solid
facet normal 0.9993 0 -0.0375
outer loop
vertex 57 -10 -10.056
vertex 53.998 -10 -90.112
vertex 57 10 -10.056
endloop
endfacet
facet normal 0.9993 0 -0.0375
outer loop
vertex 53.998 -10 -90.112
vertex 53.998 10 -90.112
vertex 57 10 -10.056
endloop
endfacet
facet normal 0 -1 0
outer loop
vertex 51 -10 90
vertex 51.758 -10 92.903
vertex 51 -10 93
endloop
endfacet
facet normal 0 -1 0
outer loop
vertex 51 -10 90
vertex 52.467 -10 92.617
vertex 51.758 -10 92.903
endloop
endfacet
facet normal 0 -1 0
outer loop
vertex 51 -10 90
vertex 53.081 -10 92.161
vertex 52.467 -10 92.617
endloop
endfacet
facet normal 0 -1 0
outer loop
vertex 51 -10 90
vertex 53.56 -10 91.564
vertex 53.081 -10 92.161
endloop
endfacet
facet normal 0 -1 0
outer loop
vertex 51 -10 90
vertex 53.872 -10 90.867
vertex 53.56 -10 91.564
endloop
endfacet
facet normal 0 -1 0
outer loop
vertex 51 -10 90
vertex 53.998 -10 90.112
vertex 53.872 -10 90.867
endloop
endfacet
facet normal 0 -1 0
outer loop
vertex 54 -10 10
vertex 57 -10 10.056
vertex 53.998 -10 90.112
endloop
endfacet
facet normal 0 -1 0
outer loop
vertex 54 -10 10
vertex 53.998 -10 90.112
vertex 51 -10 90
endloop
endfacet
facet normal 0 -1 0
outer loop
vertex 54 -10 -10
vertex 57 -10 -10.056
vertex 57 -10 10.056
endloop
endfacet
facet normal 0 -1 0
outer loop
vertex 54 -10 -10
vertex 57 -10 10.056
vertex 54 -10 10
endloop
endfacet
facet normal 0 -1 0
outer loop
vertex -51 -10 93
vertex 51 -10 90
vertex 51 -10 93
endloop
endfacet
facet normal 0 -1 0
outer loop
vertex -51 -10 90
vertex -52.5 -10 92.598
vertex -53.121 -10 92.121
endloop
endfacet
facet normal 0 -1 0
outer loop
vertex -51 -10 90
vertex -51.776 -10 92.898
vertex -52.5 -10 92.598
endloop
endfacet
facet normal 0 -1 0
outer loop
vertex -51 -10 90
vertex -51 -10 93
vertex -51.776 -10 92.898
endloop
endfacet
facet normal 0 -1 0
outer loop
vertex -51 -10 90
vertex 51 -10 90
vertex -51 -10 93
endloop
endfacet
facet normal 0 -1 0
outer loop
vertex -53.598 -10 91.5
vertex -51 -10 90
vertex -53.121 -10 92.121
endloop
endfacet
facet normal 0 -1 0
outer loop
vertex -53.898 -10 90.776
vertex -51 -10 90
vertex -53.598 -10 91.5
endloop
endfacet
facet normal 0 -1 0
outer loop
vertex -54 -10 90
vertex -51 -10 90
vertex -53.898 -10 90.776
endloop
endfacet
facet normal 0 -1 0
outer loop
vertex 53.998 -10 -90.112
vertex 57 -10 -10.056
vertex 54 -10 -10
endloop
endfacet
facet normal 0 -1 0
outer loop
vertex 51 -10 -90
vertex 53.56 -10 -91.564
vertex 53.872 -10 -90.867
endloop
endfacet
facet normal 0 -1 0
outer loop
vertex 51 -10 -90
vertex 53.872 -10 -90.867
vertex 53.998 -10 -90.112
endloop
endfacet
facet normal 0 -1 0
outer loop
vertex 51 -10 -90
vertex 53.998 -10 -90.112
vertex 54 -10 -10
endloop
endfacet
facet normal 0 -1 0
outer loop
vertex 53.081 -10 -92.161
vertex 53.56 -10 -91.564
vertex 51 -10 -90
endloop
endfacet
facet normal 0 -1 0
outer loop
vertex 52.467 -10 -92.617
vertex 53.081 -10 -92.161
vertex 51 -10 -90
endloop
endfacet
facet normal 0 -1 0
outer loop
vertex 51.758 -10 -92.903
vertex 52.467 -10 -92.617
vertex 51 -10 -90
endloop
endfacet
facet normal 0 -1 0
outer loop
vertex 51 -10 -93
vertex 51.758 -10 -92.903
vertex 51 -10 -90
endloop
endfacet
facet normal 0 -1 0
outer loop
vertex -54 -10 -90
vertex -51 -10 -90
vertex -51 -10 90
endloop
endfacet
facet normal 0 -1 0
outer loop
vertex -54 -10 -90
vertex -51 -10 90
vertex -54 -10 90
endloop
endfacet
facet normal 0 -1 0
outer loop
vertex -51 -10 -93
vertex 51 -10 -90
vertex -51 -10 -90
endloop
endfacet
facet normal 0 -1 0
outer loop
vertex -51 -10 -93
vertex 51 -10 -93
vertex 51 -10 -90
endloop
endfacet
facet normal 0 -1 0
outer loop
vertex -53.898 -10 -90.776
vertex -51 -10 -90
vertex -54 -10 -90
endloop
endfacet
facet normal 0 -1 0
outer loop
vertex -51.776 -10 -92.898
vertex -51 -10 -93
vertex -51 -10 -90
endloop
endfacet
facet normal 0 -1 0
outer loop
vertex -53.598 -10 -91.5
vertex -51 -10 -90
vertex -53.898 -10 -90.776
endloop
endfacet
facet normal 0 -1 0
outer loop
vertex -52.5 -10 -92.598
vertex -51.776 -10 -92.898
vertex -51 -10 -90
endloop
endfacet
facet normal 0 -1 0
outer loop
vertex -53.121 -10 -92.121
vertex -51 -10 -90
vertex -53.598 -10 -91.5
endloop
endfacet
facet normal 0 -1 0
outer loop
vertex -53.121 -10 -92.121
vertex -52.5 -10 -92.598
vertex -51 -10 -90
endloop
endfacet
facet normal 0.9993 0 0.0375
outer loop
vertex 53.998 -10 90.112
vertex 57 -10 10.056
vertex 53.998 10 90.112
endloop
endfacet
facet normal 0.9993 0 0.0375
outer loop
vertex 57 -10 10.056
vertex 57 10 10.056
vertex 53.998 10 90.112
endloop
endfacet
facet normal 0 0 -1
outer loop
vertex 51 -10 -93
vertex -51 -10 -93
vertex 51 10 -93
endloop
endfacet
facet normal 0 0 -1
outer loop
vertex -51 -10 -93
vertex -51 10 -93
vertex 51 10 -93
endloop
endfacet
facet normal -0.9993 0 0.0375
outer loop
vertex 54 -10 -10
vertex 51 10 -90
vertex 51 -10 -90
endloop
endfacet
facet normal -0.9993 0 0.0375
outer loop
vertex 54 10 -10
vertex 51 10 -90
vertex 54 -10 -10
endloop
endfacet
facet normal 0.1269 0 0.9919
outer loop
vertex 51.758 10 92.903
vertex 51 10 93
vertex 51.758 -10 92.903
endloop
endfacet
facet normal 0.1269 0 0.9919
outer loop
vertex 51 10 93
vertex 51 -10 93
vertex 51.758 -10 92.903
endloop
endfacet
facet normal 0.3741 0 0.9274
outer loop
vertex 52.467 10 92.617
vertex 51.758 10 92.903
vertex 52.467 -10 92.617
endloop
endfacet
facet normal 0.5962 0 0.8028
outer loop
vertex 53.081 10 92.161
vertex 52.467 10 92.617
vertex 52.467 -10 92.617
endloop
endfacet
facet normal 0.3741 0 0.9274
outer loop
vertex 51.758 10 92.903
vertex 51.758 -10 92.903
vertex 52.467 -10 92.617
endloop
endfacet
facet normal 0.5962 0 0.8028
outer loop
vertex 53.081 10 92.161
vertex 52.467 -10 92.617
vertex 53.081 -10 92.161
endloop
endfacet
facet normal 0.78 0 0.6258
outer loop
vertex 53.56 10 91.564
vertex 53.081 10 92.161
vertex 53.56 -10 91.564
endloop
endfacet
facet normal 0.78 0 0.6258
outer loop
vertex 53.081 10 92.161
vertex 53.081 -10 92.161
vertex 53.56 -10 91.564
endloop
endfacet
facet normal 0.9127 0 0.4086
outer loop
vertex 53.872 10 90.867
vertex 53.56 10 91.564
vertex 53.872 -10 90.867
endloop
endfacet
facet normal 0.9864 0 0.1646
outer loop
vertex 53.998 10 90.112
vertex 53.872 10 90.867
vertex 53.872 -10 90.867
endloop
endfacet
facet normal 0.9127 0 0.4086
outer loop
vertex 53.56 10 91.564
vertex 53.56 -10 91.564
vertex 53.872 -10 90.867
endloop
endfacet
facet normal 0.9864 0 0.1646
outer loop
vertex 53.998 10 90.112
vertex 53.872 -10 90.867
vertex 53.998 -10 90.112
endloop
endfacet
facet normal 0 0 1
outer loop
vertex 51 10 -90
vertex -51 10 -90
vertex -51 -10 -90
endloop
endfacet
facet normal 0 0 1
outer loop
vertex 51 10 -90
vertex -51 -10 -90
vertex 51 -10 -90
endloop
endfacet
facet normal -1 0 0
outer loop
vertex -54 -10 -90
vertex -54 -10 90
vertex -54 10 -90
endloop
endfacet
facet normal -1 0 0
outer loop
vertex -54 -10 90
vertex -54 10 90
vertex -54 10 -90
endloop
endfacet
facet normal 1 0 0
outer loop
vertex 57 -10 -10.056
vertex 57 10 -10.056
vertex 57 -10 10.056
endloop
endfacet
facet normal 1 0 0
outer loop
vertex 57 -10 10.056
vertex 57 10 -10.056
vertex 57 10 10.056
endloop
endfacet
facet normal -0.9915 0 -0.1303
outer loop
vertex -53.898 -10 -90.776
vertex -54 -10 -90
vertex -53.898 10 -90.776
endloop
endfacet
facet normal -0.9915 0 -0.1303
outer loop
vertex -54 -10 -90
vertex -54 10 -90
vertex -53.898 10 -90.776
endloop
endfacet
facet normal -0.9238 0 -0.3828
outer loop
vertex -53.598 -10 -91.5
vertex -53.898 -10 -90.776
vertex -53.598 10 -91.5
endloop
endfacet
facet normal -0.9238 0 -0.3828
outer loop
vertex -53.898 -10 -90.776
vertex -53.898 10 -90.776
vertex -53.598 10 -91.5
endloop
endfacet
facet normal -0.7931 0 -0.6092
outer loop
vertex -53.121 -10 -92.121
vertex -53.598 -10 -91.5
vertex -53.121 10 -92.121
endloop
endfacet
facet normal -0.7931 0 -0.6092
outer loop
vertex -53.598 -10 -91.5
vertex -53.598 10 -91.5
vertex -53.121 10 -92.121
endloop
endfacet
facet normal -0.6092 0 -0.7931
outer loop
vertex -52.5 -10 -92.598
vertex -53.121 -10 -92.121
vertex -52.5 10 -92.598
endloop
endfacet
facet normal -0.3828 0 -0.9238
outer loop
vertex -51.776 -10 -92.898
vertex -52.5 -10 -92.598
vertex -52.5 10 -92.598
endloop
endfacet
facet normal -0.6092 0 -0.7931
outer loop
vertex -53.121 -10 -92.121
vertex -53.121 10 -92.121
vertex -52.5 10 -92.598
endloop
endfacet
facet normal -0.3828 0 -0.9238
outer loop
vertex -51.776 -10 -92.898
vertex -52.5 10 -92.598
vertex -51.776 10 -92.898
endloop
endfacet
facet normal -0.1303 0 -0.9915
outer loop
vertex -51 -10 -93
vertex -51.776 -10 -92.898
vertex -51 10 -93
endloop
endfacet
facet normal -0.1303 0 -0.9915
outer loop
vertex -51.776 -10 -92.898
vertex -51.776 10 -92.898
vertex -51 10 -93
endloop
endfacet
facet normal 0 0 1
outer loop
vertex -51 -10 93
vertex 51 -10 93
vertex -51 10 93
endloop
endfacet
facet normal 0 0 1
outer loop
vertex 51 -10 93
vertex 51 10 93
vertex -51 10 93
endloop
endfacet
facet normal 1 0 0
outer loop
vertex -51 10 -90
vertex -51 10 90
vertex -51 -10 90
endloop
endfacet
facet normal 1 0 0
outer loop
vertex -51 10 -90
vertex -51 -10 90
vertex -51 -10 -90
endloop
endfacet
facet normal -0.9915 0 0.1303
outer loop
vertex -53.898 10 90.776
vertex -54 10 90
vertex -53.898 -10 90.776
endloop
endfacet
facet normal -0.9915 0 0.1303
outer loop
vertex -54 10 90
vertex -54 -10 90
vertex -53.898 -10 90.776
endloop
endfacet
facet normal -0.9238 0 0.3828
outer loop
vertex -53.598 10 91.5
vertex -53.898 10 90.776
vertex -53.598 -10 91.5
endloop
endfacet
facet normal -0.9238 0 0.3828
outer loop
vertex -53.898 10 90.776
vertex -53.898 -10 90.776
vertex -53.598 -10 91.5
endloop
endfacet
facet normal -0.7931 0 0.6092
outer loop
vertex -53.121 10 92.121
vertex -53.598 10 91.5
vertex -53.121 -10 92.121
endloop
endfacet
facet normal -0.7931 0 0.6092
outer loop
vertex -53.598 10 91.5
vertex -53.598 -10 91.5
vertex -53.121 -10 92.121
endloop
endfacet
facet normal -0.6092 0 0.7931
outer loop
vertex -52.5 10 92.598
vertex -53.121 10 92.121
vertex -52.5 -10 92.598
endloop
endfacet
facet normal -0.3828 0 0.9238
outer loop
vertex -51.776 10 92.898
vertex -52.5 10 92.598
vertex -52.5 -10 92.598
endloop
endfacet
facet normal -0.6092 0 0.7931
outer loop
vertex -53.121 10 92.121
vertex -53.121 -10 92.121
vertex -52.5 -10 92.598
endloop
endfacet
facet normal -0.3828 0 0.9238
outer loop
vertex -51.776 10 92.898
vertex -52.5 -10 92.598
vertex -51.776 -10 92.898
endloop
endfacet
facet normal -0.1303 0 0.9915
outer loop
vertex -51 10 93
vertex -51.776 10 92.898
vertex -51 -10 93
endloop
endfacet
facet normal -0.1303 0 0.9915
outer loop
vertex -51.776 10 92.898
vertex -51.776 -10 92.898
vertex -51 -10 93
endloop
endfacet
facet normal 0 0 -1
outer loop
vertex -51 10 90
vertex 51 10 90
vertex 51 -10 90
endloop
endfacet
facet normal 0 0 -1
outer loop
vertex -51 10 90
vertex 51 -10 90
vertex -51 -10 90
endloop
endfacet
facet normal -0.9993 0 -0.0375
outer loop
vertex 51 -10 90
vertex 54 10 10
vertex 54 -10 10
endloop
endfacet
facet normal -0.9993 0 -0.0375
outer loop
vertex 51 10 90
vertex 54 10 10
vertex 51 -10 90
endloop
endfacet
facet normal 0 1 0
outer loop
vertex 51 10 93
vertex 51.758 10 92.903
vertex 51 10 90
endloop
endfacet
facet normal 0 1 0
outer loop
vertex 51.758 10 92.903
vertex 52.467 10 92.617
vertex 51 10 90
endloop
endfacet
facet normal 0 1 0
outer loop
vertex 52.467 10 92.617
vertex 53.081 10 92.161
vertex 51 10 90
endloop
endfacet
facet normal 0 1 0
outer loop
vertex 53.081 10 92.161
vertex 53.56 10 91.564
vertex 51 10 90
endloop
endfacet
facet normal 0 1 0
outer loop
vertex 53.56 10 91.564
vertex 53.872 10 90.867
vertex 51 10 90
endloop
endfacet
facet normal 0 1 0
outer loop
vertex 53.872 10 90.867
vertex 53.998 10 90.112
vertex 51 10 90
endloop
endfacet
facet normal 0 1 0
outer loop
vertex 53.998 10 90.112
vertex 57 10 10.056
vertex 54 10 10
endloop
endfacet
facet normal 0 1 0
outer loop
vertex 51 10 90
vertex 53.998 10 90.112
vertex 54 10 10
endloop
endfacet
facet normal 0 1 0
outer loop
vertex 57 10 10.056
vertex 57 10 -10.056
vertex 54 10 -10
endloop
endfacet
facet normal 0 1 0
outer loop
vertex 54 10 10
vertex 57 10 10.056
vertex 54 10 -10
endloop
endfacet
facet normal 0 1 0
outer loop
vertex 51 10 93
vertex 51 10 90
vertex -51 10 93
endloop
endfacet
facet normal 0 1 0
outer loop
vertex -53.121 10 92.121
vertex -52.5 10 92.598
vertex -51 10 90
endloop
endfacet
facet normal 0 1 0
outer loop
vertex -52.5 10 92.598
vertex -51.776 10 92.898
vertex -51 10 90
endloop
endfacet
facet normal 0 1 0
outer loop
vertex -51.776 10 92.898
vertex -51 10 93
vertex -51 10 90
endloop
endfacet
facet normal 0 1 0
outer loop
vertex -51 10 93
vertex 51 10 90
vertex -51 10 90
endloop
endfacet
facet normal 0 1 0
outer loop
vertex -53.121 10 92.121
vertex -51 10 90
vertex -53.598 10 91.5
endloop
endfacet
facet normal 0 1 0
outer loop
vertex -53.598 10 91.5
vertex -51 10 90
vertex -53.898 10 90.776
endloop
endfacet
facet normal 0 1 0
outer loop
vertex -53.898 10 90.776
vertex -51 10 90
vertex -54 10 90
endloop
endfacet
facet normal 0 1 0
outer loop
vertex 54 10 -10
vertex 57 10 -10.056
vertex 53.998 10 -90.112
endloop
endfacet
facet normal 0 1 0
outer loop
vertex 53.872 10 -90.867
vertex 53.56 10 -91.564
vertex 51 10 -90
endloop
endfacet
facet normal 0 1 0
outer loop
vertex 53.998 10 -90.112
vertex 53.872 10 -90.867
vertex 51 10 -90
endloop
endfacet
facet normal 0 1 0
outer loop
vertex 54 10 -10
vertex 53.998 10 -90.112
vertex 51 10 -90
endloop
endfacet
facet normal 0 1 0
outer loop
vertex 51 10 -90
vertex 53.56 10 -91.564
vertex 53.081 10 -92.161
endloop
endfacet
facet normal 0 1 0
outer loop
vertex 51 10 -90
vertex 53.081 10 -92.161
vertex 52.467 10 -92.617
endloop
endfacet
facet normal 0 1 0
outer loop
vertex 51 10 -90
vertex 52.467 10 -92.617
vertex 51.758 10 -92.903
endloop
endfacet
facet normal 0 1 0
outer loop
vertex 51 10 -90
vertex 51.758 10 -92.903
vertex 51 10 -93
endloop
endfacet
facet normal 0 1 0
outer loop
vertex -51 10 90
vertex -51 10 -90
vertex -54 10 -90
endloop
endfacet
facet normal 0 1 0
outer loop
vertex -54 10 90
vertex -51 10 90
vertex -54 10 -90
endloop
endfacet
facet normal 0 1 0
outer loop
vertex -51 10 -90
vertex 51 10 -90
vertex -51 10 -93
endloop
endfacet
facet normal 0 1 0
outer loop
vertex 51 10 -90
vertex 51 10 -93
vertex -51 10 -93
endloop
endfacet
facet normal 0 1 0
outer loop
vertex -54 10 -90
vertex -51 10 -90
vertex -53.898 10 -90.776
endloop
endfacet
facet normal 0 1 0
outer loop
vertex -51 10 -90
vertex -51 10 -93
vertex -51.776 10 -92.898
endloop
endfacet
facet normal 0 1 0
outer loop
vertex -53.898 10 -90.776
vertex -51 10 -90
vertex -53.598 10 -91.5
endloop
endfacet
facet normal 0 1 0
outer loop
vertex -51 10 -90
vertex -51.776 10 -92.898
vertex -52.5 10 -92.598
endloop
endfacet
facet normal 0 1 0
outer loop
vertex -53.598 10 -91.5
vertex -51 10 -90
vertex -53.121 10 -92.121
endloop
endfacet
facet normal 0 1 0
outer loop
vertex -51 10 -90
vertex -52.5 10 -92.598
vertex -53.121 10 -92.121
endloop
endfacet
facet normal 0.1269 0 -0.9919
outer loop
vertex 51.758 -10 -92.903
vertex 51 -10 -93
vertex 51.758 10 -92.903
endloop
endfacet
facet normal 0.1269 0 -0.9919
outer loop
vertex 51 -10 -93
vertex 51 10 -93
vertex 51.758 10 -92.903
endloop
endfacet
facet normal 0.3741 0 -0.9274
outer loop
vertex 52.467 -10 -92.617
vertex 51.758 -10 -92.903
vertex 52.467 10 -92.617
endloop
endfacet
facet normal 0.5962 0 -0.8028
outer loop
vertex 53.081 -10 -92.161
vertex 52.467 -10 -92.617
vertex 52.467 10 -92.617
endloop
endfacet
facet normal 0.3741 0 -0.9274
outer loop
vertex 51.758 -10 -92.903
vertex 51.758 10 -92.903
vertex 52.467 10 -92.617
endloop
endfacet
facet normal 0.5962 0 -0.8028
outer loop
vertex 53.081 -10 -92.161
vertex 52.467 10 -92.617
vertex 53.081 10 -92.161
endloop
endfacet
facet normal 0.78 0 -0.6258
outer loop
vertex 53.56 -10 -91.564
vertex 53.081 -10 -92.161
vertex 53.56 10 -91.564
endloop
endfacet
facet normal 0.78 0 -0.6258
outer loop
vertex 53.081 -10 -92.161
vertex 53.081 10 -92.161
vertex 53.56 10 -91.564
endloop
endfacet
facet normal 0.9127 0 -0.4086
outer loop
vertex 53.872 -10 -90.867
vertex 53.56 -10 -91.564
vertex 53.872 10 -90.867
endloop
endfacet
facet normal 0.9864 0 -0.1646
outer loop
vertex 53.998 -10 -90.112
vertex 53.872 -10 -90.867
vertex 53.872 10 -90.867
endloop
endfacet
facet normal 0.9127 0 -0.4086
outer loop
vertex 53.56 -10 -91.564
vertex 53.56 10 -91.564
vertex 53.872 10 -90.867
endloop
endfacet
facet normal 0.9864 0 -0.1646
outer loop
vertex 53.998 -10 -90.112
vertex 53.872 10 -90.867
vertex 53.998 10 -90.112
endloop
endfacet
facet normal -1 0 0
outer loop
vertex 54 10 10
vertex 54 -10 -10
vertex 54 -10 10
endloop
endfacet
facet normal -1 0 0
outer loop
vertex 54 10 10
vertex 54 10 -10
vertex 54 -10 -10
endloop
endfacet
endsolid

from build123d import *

# Parameters (mm, degrees)
EXTRUDE_THIN1_DEPTH = 10
FILLET1_R           = 3


with BuildPart() as part:
    # Sketch1 → Extrude-Thin1 (new, symmetric)
    with BuildSketch(Plane(origin=(0, 0, 0), x_dir=(1, 0, 0), z_dir=(0, 1, 0))):
        Polygon((57, 10.056230239), (57, -10.056230239), (53.889608634, -93), (-54, -93), (-54, 93), (53.889608634, 93), align=None)
        Polygon((54, 10), (54, -10), (51, -90), (-51, -90), (-51, 90), (51, 90), align=None, mode=Mode.SUBTRACT)
    extrude(amount=EXTRUDE_THIN1_DEPTH, both=True)

    # Fillet1
    fillet1_edges = [part.edges().sort_by_distance(p)[0] for p in [
        (57, 0, 10.056230239),
        (53.889608634, 0, 93),
        (-54, 0, 93),
        (-54, 0, -93),
        (53.889608634, 0, -93),
        (57, 0, -10.056230239),
    ]]
    fillet(fillet1_edges, radius=FILLET1_R)


solid = part.part
